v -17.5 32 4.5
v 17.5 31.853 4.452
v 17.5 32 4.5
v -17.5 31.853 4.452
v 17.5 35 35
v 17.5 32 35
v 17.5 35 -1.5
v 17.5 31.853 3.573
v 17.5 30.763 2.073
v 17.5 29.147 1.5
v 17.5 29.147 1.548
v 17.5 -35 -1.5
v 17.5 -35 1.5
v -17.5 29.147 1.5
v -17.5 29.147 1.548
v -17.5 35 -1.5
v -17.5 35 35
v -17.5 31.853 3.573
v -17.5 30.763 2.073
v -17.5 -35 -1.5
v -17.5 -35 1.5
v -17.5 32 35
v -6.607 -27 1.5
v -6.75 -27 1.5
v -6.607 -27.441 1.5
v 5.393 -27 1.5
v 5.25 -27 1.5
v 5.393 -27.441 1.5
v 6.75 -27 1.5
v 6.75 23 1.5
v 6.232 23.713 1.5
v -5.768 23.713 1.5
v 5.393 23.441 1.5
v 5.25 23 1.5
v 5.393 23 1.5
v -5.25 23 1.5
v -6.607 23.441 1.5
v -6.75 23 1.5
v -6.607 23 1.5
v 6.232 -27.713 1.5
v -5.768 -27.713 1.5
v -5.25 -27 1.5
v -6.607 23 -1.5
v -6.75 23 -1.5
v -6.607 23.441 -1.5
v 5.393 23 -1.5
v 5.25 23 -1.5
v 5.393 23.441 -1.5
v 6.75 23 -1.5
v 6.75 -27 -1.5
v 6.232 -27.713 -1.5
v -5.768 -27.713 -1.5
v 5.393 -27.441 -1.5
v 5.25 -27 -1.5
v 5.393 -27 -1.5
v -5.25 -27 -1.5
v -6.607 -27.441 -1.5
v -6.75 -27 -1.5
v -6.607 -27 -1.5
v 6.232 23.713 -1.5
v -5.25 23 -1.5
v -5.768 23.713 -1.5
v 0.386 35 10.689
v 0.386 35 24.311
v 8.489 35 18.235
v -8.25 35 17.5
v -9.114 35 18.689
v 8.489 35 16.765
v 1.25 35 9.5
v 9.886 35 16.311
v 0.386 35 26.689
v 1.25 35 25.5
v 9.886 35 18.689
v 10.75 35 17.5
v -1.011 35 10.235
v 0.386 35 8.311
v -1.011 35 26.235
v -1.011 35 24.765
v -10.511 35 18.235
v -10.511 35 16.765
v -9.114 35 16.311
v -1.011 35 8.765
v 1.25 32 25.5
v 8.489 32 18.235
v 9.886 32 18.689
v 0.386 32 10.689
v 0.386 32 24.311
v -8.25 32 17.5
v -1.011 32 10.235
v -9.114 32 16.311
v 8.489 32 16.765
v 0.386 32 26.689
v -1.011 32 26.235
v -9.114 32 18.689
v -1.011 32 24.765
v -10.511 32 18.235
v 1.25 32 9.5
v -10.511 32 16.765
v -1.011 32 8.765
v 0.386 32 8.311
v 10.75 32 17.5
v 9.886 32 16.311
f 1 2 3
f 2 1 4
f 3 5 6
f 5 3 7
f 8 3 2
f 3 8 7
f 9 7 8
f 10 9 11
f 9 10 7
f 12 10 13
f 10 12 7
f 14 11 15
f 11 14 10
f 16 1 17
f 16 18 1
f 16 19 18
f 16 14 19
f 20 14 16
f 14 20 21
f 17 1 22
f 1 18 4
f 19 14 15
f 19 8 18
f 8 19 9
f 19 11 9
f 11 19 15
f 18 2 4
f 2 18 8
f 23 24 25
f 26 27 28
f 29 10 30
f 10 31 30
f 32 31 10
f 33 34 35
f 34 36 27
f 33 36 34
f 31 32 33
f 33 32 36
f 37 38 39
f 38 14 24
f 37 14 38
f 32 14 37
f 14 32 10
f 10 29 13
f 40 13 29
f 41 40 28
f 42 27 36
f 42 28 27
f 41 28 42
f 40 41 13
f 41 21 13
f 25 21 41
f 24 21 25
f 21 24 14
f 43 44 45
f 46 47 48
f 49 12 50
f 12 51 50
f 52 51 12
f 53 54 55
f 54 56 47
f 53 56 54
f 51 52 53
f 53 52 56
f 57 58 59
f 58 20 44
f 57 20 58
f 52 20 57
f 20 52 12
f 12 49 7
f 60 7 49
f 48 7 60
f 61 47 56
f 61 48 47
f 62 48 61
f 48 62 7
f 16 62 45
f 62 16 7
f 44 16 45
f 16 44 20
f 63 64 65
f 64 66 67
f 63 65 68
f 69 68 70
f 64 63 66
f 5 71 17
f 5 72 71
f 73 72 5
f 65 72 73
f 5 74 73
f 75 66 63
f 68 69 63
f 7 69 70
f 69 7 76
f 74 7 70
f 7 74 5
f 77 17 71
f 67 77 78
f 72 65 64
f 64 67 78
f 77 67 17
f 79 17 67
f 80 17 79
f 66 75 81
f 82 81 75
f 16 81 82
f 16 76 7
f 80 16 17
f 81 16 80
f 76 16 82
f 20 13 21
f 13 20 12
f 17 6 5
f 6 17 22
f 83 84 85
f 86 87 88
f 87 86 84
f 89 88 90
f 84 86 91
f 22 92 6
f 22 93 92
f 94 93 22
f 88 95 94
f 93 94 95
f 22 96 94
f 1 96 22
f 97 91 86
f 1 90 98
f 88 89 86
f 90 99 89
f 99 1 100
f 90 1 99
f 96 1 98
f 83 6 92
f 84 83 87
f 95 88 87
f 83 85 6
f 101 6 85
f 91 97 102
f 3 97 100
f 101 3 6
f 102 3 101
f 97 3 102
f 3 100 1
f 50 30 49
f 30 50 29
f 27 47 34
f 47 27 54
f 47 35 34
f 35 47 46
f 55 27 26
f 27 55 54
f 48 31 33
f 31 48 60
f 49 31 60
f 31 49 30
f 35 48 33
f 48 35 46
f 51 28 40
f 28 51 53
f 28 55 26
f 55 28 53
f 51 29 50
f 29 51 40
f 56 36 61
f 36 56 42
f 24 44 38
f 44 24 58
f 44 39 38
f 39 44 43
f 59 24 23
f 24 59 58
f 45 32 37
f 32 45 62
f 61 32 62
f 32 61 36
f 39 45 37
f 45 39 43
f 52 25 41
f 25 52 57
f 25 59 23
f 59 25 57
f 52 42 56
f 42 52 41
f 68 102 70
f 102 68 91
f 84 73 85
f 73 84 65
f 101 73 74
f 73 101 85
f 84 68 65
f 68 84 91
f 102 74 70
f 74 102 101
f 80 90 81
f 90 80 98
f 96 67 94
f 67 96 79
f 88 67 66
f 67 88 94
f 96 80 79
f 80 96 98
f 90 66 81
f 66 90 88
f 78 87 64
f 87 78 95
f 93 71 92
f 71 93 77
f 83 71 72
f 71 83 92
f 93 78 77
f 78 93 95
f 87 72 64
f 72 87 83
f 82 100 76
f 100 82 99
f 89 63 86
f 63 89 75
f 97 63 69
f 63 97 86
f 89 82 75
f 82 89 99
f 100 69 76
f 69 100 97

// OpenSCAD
module MotorMountHoles(depth) {
  mount_width = 19;
  mount_height = 16;
  screw_type = 2.5;

  translate([mount_width / 2.0, 0.0]) {
    #cylinder(r=screw_type / 2.0, h=depth, center=true);
  }
  translate([-mount_width / 2.0, 0.0]) {
    #cylinder(r=screw_type / 2.0, h=depth, center=true);
  }

  translate([0.0, mount_height / 2.0]) {
    #cylinder(r=screw_type / 2.0, h=depth, center=true);
  }
  translate([0.0, -mount_height / 2.0]) {
    #cylinder(r=screw_type / 2.0, h=depth, center=true);
  }
}

module GimbalBracket(width, length, depth) {
  cube([width, length, depth], center=true);
  translate([0.0, (length / 2.0) - depth / 2.0, width / 2.0]) {
    cube([width, depth, width], center=true);
  }

  // fillet
  translate([0, (length / 2.0) - depth, depth / 2.0]) {
      rotate([0, 90]) {
        difference() {
            cylinder(r=3, h=width, center=true);
            translate([-3.0, -3.0, 0.0]) {
              cylinder(r=3, h=width, center=true);
            }
        }
      }
  }
}

module MotorVariableMountHole(depth) {
  screw_type = 1.5;
  width = 50;
  height = 12;

  translate([height / 2.0, 0.0]) {
    cube([screw_type, width, depth], center=true);
    translate([0.0, width / 2.0]) {
      cylinder(r=screw_type / 2.0, h=depth, center=true);
    }
    translate([0.0, -width / 2.0]) {
      cylinder(r=screw_type / 2.0, h=depth, center=true);
    }
  }

  translate([-height / 2.0, 0.0]) {
    cube([screw_type, width, depth], center=true);
    translate([0.0, width / 2.0]) {
      cylinder(r=screw_type / 2.0, h=depth, center=true);
    }
    translate([0.0, -width / 2.0]) {
      cylinder(r=screw_type / 2.0, h=depth, center=true);
    }
  }
}

difference() {
  bracket_width = 35;
  bracket_length = 70;
  bracket_depth = 3;

  // gimbal bracket
  GimbalBracket(bracket_width, bracket_length, bracket_depth);

  // motor mount holes
  translate([0.0, -2.0]) {
    MotorVariableMountHole(bracket_depth + 0.01);
  }

  translate([0.0, (bracket_length / 2.0) - (bracket_depth / 2.0), bracket_width / 2.0]) {
    rotate([90.0, 0.0, 0.0]) {
      MotorMountHoles(bracket_depth + 0.01);
    }
  }
}
